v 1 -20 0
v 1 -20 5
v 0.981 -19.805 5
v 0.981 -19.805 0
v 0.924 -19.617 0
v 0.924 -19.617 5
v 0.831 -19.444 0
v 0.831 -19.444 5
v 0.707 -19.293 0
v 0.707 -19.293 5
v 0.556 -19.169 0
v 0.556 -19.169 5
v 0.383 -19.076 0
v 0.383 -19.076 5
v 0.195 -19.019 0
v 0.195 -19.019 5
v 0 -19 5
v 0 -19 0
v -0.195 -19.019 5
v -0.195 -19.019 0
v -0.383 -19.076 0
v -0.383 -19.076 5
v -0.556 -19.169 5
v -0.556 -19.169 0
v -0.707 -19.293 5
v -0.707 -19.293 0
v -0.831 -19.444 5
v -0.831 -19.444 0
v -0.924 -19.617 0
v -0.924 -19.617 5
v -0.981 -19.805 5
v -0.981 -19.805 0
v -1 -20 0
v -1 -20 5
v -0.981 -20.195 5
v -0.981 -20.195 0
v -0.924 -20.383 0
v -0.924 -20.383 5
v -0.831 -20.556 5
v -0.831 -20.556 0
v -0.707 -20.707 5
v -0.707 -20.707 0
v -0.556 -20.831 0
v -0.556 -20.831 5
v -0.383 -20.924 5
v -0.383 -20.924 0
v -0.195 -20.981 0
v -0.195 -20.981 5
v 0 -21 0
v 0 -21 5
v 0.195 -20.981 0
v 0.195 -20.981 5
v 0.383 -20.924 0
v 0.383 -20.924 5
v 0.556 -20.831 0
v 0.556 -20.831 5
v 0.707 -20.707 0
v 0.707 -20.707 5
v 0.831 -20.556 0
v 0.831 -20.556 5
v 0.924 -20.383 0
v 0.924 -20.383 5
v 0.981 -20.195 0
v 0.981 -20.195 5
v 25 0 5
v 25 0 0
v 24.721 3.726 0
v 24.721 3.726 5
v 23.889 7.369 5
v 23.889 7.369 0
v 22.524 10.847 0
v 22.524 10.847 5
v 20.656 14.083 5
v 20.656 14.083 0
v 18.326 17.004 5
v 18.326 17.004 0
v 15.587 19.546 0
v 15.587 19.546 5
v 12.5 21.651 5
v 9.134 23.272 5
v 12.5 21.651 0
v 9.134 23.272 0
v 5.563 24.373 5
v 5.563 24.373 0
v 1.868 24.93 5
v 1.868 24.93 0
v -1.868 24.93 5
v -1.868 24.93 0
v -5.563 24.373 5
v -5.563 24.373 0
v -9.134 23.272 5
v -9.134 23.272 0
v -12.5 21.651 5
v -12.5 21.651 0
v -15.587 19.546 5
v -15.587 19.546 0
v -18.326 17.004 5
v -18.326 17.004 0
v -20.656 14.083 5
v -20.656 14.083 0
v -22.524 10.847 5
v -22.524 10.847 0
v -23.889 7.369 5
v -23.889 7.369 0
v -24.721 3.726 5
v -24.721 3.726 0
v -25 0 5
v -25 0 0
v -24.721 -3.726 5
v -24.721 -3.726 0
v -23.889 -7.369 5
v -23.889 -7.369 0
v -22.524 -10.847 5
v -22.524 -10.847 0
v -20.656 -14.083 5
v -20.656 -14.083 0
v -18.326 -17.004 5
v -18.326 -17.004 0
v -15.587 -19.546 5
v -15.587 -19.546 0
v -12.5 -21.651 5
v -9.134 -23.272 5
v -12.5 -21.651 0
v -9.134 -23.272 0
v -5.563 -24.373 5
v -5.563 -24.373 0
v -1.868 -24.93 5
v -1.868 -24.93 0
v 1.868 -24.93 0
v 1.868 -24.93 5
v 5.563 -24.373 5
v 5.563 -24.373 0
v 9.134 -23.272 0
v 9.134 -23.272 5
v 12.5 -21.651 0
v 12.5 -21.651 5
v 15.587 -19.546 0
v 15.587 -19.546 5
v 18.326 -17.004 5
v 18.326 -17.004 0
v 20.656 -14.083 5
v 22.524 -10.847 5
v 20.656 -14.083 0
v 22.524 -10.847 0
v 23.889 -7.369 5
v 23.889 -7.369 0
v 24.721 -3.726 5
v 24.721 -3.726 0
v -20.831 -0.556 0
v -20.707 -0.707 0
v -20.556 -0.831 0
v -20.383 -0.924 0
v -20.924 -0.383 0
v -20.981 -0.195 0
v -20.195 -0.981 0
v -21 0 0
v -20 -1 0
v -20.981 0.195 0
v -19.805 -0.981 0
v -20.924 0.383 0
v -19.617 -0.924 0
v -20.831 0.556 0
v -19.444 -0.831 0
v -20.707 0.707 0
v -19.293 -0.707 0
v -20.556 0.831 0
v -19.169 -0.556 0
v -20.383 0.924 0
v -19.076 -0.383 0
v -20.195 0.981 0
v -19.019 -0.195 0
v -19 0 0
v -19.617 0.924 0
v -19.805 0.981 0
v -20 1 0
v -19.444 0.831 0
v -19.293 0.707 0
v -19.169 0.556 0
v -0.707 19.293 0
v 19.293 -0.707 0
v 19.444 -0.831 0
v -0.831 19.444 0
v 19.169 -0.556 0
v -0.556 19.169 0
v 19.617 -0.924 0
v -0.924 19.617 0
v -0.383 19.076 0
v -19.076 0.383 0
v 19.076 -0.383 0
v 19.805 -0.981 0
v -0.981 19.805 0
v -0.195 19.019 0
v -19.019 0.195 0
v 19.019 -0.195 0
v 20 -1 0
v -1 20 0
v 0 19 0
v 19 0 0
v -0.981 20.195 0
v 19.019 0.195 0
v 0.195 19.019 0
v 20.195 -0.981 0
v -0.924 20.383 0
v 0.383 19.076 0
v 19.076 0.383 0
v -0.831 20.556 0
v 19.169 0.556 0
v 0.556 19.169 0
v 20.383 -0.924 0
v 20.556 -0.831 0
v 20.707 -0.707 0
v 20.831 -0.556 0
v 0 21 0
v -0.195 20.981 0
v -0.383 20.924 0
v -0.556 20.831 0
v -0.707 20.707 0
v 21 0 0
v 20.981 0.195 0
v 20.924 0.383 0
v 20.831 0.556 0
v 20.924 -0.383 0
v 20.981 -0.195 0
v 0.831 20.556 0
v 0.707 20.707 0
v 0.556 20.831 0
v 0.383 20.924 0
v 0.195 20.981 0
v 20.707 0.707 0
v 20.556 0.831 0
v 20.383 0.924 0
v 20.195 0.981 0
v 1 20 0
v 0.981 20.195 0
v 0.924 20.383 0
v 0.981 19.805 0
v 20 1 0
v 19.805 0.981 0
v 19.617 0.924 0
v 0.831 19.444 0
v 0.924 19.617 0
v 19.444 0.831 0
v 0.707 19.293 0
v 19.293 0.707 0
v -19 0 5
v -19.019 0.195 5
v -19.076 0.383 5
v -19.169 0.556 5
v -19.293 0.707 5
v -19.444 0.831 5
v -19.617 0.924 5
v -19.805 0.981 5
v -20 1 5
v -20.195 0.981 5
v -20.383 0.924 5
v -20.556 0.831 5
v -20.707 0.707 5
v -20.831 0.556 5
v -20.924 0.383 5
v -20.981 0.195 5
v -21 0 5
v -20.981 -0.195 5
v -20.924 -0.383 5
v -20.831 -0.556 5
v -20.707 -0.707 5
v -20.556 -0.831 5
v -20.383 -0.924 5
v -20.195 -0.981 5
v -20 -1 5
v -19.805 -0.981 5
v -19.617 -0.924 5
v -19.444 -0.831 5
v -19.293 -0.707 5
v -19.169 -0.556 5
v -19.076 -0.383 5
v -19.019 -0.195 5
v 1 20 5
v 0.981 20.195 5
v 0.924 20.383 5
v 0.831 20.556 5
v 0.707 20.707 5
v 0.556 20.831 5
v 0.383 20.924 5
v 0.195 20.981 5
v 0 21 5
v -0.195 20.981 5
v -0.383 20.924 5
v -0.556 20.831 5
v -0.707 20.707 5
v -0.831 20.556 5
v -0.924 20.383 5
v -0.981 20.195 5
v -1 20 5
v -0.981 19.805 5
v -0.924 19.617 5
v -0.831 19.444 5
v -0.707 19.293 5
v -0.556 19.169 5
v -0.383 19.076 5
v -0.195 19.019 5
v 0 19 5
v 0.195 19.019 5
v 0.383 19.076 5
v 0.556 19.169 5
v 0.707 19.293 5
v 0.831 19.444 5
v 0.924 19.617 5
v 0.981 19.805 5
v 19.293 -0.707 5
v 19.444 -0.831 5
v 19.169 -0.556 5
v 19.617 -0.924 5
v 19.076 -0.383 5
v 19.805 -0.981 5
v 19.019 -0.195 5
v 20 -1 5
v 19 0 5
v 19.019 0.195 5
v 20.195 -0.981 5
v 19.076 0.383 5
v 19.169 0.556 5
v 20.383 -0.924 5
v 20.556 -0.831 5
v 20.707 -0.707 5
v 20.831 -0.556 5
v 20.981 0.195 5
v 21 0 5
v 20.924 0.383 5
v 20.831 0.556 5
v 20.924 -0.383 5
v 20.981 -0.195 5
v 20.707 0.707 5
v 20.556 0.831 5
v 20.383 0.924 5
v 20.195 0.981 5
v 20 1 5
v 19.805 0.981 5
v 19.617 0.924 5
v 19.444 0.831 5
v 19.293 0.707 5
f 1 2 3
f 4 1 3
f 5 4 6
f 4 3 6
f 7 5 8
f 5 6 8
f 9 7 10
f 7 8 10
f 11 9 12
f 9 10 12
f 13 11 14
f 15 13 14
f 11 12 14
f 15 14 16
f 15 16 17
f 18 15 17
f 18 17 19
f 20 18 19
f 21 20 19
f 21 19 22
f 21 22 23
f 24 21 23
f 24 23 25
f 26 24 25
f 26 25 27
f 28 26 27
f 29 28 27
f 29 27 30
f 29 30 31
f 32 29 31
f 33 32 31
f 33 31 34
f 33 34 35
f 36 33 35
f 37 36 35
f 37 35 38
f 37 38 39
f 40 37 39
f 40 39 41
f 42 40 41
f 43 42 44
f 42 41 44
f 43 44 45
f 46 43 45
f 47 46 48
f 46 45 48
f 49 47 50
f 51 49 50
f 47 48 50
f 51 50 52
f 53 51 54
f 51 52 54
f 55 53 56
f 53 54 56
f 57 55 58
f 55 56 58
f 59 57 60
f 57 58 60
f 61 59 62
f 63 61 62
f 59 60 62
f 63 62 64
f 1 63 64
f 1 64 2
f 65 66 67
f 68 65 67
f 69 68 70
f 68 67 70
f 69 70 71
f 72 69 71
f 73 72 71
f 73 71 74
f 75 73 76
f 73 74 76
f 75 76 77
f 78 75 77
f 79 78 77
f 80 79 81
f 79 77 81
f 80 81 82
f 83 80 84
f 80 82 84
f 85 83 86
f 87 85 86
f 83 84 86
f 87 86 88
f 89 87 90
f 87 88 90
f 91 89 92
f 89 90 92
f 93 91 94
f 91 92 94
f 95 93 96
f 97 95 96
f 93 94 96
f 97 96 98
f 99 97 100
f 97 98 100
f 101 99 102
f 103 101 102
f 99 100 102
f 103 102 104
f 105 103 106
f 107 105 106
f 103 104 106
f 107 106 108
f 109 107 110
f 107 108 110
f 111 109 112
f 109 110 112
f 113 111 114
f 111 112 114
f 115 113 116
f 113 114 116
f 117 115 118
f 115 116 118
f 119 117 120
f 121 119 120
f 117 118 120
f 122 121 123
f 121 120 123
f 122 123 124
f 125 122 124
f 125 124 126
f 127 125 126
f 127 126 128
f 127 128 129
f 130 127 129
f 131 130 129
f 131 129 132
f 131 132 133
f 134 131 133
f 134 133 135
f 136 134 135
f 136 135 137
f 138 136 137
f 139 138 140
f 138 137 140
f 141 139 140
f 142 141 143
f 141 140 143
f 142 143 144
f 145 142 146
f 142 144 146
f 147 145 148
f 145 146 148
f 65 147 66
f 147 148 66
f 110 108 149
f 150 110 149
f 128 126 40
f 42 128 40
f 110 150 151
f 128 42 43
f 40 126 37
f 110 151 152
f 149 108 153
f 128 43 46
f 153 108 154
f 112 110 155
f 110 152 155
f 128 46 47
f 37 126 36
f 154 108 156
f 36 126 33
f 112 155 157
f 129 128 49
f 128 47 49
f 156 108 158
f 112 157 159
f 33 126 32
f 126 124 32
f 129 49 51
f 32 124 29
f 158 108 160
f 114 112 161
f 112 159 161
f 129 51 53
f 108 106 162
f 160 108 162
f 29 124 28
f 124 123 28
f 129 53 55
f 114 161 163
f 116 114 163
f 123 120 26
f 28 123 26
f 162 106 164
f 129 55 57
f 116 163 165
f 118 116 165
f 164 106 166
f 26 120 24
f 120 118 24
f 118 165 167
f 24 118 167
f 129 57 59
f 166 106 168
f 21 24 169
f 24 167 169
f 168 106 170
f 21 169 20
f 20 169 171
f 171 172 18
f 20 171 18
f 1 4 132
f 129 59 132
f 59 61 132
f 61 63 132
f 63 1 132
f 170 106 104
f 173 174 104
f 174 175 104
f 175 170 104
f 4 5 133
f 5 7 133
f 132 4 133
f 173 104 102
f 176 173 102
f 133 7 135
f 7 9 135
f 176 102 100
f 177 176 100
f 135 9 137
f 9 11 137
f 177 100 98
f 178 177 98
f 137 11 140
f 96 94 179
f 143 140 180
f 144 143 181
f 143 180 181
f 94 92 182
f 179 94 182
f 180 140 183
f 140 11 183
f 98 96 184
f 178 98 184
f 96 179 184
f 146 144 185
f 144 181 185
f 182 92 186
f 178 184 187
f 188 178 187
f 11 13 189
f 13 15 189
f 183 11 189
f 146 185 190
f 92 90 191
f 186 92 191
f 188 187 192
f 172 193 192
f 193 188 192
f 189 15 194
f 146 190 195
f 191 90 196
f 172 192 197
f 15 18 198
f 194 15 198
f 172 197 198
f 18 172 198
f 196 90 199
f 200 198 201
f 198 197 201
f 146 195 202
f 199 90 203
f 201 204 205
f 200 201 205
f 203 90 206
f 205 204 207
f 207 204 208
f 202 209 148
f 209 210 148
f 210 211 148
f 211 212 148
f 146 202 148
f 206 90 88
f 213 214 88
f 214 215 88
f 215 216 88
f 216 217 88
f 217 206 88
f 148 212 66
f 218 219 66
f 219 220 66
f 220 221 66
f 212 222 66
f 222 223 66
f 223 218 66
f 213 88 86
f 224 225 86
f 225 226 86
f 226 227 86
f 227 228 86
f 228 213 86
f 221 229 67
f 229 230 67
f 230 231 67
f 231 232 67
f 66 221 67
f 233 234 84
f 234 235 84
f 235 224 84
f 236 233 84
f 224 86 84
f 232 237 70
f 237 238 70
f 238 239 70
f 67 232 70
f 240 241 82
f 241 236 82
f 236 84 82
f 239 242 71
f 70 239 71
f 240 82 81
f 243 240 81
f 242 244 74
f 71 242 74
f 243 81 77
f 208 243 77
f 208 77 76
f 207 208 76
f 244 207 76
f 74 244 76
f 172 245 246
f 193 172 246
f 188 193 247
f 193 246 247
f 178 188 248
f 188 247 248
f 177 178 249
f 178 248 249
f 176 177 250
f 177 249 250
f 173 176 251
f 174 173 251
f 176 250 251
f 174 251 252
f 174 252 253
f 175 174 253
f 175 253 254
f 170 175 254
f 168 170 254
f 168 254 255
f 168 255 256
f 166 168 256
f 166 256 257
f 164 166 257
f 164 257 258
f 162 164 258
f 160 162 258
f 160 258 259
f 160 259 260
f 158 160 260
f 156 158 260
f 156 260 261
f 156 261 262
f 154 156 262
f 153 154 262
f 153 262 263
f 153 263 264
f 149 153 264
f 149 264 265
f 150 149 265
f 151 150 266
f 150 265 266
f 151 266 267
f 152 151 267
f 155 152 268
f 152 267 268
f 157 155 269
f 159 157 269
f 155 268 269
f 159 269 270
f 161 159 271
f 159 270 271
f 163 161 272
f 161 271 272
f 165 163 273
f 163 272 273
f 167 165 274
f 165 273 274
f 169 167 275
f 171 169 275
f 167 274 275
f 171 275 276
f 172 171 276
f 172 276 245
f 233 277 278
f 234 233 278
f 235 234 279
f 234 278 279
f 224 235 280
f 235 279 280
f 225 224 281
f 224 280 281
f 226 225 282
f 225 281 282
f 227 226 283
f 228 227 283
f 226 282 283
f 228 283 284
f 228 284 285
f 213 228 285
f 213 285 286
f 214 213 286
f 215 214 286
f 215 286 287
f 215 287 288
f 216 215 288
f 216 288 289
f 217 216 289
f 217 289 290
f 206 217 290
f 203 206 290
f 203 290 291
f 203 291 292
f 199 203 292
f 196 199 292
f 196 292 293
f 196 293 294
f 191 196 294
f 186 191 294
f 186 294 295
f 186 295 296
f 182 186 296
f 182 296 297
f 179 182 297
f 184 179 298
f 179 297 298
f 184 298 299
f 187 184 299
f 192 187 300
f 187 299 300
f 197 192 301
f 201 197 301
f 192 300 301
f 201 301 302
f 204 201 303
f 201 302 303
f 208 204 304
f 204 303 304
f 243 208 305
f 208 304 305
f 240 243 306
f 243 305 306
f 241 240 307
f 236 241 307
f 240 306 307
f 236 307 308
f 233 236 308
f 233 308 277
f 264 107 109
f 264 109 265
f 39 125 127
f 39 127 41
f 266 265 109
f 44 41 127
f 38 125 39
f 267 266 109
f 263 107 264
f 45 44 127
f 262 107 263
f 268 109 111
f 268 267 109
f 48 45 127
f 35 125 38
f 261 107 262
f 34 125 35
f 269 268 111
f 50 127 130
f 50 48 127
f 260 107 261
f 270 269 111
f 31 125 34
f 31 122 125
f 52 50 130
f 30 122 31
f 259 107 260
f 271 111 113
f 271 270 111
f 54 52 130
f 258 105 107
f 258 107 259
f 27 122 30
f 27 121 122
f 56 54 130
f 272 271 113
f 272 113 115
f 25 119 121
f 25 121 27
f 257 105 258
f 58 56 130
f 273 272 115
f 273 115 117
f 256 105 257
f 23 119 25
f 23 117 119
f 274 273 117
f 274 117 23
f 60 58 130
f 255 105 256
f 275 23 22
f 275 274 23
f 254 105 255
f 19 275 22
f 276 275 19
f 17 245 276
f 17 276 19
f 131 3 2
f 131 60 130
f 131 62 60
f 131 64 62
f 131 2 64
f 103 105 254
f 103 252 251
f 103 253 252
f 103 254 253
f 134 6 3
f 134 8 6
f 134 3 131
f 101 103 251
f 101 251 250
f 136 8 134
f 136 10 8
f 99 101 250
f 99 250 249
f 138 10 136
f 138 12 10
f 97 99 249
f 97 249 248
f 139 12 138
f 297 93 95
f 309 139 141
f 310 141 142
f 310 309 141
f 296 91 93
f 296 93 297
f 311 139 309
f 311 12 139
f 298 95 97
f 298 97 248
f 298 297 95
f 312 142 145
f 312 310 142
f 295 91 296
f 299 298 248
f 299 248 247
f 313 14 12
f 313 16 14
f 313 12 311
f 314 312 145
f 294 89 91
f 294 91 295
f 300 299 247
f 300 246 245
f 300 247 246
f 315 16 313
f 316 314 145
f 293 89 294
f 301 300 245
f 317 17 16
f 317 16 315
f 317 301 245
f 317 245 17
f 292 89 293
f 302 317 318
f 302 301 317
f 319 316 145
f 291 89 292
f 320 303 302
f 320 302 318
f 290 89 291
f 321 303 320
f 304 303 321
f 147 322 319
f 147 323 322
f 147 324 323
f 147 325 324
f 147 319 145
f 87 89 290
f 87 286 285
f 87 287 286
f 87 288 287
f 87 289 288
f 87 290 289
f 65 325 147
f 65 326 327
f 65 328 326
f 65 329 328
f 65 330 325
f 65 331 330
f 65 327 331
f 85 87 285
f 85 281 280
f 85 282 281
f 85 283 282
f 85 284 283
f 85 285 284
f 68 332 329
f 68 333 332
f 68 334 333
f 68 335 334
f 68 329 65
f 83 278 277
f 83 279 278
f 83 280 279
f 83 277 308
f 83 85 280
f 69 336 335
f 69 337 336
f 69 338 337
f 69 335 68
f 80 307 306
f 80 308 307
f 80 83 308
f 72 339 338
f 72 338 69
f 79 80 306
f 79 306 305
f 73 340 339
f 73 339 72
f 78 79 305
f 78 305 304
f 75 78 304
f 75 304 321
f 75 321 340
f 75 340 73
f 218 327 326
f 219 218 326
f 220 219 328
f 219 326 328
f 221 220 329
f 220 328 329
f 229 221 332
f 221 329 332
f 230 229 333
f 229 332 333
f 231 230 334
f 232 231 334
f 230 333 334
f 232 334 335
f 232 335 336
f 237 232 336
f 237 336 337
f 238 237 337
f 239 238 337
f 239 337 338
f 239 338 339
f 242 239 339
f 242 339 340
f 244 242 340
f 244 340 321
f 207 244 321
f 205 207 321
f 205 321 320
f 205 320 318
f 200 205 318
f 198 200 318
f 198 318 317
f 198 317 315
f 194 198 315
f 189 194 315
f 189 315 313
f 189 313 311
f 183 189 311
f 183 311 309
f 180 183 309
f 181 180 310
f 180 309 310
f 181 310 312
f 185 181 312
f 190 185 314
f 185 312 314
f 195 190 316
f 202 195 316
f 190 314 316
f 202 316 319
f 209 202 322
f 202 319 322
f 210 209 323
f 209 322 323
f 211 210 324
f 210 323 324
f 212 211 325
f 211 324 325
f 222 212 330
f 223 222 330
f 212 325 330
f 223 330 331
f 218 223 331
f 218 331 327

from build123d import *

# Parameters (mm, degrees)
F0_R     = 25
F1_DEPTH = 5
F2_R     = 1
F3_DEPTH = 5.001


with BuildPart() as f1:
    # F0 (on Top) → F1 (new body)
    with BuildSketch(Plane.XY):
        Circle(F0_R)
    extrude(amount=F1_DEPTH)

    # F2 (on face) → F3 (cut, through all)
    with BuildSketch(Plane.XY.offset(5)):
        with Locations((0, 20)):
            Circle(F2_R)
        with Locations((-20, 0)):
            Circle(F2_R)
        with Locations((0, -20)):
            Circle(F2_R)
        with Locations((20, 0)):
            Circle(F2_R)
    extrude(amount=-F3_DEPTH, mode=Mode.SUBTRACT)


solid = f1.part
